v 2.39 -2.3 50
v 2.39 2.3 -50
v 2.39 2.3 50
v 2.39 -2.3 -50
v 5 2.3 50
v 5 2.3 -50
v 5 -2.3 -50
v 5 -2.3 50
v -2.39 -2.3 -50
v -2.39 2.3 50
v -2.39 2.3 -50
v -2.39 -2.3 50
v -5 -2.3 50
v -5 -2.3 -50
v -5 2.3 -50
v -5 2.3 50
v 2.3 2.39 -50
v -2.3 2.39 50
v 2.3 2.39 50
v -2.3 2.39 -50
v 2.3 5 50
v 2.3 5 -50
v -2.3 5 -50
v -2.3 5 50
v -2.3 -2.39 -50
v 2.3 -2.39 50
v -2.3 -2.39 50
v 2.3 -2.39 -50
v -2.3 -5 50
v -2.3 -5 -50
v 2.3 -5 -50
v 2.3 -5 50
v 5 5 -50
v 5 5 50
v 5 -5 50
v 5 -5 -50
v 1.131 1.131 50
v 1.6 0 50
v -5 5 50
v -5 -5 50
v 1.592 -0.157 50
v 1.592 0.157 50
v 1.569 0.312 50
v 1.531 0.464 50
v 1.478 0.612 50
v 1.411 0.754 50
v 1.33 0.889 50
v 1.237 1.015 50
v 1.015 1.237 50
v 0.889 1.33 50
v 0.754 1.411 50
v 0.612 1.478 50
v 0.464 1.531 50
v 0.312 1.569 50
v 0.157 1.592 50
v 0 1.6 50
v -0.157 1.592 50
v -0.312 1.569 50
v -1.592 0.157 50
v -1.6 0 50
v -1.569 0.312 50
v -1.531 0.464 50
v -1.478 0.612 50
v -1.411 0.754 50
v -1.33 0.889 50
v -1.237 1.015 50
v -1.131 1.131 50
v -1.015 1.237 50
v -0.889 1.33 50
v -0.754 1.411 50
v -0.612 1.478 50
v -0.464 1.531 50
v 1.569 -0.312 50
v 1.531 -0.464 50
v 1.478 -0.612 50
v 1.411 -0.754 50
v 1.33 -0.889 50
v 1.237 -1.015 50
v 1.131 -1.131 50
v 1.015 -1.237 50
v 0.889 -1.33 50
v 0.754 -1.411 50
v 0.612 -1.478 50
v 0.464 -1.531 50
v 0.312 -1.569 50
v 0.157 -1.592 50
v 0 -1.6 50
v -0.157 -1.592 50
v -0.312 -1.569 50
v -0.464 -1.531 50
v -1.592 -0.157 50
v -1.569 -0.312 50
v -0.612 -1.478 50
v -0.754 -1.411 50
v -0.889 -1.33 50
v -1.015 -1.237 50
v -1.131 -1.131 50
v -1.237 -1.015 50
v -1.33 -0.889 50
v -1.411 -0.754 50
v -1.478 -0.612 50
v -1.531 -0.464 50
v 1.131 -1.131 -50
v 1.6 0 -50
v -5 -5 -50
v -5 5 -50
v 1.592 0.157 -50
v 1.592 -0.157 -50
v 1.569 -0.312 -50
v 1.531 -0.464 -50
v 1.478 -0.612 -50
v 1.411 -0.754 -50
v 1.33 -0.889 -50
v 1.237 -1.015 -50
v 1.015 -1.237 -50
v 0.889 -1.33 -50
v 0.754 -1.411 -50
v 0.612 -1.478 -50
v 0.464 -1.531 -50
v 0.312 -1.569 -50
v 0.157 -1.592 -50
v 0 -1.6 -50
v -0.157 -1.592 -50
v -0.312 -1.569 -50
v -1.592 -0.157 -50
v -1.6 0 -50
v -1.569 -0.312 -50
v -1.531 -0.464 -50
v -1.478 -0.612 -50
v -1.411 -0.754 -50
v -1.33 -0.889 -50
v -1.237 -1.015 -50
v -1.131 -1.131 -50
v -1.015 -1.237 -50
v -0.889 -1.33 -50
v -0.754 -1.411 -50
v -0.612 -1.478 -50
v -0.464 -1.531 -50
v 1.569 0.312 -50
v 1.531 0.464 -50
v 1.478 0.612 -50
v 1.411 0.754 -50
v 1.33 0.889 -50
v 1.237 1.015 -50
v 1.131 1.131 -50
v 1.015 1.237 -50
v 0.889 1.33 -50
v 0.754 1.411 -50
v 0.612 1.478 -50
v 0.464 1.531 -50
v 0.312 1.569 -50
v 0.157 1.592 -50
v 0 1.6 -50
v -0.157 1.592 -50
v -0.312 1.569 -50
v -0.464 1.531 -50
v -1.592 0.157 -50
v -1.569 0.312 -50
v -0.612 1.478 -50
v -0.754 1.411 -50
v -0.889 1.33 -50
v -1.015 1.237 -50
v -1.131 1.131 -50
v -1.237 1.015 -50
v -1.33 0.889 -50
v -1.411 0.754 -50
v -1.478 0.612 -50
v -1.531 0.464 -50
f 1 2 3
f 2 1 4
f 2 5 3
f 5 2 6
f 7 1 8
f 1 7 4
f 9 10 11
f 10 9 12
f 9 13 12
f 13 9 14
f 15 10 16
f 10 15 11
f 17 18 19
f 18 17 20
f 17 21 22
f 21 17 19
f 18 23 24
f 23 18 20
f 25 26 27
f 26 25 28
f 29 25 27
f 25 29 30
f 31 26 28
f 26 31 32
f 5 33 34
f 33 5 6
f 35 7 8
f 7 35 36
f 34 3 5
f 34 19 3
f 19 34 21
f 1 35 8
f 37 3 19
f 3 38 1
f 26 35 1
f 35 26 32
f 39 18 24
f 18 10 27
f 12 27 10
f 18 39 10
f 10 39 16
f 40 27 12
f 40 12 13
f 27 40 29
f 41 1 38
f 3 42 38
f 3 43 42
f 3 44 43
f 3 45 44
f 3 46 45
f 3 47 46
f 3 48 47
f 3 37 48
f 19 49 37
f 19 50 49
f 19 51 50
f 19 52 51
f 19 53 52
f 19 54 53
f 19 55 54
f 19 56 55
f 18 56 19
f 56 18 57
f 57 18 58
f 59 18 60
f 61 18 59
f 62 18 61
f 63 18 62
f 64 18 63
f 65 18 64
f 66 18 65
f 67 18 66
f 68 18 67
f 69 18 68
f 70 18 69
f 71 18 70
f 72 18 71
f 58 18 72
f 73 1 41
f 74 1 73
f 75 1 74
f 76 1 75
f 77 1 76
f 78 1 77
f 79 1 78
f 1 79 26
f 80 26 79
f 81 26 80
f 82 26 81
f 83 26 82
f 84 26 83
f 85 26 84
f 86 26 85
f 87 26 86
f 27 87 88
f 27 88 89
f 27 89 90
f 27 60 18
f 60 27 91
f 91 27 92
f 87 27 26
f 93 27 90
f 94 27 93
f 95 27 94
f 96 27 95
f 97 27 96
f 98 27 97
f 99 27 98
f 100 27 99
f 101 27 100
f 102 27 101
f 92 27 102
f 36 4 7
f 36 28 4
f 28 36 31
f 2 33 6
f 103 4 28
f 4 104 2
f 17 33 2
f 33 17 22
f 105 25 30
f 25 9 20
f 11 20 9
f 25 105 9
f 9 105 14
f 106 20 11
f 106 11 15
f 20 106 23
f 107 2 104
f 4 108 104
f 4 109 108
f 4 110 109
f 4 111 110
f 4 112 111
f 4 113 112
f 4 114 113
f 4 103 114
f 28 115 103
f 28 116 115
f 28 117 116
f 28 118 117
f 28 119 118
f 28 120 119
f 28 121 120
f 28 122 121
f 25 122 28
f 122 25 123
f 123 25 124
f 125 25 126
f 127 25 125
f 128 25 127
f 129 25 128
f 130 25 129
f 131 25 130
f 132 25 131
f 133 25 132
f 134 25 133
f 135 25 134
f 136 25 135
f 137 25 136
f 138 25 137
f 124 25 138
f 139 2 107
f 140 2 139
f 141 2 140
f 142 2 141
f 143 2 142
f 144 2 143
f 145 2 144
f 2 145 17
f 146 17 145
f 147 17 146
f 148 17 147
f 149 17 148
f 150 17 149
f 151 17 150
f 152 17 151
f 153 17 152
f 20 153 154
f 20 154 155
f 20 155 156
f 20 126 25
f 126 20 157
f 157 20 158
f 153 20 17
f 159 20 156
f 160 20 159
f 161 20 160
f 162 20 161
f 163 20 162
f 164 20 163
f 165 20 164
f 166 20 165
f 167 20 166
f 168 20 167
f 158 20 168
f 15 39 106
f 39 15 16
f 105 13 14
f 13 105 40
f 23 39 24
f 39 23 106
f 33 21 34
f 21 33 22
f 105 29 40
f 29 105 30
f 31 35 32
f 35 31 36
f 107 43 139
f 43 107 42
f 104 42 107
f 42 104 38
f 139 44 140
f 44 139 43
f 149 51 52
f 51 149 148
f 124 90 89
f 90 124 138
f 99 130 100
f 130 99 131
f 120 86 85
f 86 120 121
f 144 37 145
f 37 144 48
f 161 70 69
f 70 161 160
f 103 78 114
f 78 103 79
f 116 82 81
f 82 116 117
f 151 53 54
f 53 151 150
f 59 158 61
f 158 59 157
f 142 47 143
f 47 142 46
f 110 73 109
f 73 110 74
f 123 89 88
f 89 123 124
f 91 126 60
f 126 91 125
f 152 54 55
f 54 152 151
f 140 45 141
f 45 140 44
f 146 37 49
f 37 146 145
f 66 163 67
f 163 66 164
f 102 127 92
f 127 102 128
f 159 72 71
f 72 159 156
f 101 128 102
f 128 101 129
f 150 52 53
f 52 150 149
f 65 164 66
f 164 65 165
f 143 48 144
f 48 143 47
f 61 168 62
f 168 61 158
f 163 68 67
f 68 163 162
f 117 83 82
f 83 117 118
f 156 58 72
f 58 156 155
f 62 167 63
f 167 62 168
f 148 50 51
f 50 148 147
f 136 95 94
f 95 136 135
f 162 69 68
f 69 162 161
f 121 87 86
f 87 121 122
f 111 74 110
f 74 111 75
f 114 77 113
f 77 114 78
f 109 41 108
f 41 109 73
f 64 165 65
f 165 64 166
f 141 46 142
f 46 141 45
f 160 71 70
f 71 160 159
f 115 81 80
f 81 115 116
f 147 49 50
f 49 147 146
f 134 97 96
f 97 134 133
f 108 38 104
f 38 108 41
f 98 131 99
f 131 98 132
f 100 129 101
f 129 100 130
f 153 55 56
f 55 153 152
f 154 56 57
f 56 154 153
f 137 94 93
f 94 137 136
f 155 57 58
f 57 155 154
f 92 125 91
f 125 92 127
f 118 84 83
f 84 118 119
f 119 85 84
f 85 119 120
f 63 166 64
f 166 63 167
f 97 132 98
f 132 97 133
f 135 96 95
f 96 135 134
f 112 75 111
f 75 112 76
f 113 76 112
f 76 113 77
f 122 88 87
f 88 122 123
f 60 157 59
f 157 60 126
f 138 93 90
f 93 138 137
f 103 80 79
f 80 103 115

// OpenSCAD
// 10x10 aluminium extrusion profile, 100mm long (simple T-slot style)
// One connected solid; all feature placement uses formulas from dimensions.

$fn = 64;

// Target dimensions
profile_w = 10.0;
profile_h = 10.0;
length    = 100.0;

// Profile feature parameters (kept conservative so walls remain)
wall            = 1.2;   // outer wall thickness
slot_open       = 2.2;   // opening at the surface for each T-slot
slot_depth      = 2.6;   // depth of slot from outer surface toward center
slot_inner_w    = 4.6;   // wider inner cavity width (T-slot undercut look)
center_hole_d   = 3.2;   // central bore diameter
eps             = 0.02;  // small overlap for robust boolean ops

module tslot_cut_x() {
    // Cuts a T-slot from +X face inward (along X), extruded along Z
    // Opening (narrow) near surface:
    translate([ profile_w/2 - slot_depth/2, 0, 0 ])
        cube([slot_depth + eps, slot_open, length + 2*eps], center=true);

    // Inner cavity (wider) slightly deeper:
    translate([ profile_w/2 - slot_depth + (slot_depth/2), 0, 0 ])
        cube([slot_depth + eps, slot_inner_w, length + 2*eps], center=true);
}

module tslot_cut_y() {
    // Cuts a T-slot from +Y face inward (along Y), extruded along Z
    translate([ 0, profile_h/2 - slot_depth/2, 0 ])
        cube([slot_open, slot_depth + eps, length + 2*eps], center=true);

    translate([ 0, profile_h/2 - slot_depth + (slot_depth/2), 0 ])
        cube([slot_inner_w, slot_depth + eps, length + 2*eps], center=true);
}

module extrusion_10x10(len=length) {
    // Ensure parameters don't destroy the profile
    assert(wall > 0);
    assert(slot_depth > 0 && slot_depth < profile_w/2);
    assert(slot_open > 0 && slot_open < profile_h - 2*wall);
    assert(slot_inner_w > slot_open && slot_inner_w < profile_h - 2*wall);

    color("Silver")
    difference() {
        // Outer body
        cube([profile_w, profile_h, len], center=true);

        // Central bore
        cylinder(h=len + 2*eps, d=center_hole_d, center=true);

        // Four T-slots (one per face), made by rotating the same cutters
        // +X face
        tslot_cut_x();
        // -X face
        rotate([0,0,180]) tslot_cut_x();

        // +Y face
        tslot_cut_y();
        // -Y face
        rotate([0,0,180]) tslot_cut_y();

        // Optional: keep a minimum wall at corners by trimming slot reach (implicit via slot_depth)
        // No extra arbitrary translations.
    }
}

extrusion_10x10(length);
